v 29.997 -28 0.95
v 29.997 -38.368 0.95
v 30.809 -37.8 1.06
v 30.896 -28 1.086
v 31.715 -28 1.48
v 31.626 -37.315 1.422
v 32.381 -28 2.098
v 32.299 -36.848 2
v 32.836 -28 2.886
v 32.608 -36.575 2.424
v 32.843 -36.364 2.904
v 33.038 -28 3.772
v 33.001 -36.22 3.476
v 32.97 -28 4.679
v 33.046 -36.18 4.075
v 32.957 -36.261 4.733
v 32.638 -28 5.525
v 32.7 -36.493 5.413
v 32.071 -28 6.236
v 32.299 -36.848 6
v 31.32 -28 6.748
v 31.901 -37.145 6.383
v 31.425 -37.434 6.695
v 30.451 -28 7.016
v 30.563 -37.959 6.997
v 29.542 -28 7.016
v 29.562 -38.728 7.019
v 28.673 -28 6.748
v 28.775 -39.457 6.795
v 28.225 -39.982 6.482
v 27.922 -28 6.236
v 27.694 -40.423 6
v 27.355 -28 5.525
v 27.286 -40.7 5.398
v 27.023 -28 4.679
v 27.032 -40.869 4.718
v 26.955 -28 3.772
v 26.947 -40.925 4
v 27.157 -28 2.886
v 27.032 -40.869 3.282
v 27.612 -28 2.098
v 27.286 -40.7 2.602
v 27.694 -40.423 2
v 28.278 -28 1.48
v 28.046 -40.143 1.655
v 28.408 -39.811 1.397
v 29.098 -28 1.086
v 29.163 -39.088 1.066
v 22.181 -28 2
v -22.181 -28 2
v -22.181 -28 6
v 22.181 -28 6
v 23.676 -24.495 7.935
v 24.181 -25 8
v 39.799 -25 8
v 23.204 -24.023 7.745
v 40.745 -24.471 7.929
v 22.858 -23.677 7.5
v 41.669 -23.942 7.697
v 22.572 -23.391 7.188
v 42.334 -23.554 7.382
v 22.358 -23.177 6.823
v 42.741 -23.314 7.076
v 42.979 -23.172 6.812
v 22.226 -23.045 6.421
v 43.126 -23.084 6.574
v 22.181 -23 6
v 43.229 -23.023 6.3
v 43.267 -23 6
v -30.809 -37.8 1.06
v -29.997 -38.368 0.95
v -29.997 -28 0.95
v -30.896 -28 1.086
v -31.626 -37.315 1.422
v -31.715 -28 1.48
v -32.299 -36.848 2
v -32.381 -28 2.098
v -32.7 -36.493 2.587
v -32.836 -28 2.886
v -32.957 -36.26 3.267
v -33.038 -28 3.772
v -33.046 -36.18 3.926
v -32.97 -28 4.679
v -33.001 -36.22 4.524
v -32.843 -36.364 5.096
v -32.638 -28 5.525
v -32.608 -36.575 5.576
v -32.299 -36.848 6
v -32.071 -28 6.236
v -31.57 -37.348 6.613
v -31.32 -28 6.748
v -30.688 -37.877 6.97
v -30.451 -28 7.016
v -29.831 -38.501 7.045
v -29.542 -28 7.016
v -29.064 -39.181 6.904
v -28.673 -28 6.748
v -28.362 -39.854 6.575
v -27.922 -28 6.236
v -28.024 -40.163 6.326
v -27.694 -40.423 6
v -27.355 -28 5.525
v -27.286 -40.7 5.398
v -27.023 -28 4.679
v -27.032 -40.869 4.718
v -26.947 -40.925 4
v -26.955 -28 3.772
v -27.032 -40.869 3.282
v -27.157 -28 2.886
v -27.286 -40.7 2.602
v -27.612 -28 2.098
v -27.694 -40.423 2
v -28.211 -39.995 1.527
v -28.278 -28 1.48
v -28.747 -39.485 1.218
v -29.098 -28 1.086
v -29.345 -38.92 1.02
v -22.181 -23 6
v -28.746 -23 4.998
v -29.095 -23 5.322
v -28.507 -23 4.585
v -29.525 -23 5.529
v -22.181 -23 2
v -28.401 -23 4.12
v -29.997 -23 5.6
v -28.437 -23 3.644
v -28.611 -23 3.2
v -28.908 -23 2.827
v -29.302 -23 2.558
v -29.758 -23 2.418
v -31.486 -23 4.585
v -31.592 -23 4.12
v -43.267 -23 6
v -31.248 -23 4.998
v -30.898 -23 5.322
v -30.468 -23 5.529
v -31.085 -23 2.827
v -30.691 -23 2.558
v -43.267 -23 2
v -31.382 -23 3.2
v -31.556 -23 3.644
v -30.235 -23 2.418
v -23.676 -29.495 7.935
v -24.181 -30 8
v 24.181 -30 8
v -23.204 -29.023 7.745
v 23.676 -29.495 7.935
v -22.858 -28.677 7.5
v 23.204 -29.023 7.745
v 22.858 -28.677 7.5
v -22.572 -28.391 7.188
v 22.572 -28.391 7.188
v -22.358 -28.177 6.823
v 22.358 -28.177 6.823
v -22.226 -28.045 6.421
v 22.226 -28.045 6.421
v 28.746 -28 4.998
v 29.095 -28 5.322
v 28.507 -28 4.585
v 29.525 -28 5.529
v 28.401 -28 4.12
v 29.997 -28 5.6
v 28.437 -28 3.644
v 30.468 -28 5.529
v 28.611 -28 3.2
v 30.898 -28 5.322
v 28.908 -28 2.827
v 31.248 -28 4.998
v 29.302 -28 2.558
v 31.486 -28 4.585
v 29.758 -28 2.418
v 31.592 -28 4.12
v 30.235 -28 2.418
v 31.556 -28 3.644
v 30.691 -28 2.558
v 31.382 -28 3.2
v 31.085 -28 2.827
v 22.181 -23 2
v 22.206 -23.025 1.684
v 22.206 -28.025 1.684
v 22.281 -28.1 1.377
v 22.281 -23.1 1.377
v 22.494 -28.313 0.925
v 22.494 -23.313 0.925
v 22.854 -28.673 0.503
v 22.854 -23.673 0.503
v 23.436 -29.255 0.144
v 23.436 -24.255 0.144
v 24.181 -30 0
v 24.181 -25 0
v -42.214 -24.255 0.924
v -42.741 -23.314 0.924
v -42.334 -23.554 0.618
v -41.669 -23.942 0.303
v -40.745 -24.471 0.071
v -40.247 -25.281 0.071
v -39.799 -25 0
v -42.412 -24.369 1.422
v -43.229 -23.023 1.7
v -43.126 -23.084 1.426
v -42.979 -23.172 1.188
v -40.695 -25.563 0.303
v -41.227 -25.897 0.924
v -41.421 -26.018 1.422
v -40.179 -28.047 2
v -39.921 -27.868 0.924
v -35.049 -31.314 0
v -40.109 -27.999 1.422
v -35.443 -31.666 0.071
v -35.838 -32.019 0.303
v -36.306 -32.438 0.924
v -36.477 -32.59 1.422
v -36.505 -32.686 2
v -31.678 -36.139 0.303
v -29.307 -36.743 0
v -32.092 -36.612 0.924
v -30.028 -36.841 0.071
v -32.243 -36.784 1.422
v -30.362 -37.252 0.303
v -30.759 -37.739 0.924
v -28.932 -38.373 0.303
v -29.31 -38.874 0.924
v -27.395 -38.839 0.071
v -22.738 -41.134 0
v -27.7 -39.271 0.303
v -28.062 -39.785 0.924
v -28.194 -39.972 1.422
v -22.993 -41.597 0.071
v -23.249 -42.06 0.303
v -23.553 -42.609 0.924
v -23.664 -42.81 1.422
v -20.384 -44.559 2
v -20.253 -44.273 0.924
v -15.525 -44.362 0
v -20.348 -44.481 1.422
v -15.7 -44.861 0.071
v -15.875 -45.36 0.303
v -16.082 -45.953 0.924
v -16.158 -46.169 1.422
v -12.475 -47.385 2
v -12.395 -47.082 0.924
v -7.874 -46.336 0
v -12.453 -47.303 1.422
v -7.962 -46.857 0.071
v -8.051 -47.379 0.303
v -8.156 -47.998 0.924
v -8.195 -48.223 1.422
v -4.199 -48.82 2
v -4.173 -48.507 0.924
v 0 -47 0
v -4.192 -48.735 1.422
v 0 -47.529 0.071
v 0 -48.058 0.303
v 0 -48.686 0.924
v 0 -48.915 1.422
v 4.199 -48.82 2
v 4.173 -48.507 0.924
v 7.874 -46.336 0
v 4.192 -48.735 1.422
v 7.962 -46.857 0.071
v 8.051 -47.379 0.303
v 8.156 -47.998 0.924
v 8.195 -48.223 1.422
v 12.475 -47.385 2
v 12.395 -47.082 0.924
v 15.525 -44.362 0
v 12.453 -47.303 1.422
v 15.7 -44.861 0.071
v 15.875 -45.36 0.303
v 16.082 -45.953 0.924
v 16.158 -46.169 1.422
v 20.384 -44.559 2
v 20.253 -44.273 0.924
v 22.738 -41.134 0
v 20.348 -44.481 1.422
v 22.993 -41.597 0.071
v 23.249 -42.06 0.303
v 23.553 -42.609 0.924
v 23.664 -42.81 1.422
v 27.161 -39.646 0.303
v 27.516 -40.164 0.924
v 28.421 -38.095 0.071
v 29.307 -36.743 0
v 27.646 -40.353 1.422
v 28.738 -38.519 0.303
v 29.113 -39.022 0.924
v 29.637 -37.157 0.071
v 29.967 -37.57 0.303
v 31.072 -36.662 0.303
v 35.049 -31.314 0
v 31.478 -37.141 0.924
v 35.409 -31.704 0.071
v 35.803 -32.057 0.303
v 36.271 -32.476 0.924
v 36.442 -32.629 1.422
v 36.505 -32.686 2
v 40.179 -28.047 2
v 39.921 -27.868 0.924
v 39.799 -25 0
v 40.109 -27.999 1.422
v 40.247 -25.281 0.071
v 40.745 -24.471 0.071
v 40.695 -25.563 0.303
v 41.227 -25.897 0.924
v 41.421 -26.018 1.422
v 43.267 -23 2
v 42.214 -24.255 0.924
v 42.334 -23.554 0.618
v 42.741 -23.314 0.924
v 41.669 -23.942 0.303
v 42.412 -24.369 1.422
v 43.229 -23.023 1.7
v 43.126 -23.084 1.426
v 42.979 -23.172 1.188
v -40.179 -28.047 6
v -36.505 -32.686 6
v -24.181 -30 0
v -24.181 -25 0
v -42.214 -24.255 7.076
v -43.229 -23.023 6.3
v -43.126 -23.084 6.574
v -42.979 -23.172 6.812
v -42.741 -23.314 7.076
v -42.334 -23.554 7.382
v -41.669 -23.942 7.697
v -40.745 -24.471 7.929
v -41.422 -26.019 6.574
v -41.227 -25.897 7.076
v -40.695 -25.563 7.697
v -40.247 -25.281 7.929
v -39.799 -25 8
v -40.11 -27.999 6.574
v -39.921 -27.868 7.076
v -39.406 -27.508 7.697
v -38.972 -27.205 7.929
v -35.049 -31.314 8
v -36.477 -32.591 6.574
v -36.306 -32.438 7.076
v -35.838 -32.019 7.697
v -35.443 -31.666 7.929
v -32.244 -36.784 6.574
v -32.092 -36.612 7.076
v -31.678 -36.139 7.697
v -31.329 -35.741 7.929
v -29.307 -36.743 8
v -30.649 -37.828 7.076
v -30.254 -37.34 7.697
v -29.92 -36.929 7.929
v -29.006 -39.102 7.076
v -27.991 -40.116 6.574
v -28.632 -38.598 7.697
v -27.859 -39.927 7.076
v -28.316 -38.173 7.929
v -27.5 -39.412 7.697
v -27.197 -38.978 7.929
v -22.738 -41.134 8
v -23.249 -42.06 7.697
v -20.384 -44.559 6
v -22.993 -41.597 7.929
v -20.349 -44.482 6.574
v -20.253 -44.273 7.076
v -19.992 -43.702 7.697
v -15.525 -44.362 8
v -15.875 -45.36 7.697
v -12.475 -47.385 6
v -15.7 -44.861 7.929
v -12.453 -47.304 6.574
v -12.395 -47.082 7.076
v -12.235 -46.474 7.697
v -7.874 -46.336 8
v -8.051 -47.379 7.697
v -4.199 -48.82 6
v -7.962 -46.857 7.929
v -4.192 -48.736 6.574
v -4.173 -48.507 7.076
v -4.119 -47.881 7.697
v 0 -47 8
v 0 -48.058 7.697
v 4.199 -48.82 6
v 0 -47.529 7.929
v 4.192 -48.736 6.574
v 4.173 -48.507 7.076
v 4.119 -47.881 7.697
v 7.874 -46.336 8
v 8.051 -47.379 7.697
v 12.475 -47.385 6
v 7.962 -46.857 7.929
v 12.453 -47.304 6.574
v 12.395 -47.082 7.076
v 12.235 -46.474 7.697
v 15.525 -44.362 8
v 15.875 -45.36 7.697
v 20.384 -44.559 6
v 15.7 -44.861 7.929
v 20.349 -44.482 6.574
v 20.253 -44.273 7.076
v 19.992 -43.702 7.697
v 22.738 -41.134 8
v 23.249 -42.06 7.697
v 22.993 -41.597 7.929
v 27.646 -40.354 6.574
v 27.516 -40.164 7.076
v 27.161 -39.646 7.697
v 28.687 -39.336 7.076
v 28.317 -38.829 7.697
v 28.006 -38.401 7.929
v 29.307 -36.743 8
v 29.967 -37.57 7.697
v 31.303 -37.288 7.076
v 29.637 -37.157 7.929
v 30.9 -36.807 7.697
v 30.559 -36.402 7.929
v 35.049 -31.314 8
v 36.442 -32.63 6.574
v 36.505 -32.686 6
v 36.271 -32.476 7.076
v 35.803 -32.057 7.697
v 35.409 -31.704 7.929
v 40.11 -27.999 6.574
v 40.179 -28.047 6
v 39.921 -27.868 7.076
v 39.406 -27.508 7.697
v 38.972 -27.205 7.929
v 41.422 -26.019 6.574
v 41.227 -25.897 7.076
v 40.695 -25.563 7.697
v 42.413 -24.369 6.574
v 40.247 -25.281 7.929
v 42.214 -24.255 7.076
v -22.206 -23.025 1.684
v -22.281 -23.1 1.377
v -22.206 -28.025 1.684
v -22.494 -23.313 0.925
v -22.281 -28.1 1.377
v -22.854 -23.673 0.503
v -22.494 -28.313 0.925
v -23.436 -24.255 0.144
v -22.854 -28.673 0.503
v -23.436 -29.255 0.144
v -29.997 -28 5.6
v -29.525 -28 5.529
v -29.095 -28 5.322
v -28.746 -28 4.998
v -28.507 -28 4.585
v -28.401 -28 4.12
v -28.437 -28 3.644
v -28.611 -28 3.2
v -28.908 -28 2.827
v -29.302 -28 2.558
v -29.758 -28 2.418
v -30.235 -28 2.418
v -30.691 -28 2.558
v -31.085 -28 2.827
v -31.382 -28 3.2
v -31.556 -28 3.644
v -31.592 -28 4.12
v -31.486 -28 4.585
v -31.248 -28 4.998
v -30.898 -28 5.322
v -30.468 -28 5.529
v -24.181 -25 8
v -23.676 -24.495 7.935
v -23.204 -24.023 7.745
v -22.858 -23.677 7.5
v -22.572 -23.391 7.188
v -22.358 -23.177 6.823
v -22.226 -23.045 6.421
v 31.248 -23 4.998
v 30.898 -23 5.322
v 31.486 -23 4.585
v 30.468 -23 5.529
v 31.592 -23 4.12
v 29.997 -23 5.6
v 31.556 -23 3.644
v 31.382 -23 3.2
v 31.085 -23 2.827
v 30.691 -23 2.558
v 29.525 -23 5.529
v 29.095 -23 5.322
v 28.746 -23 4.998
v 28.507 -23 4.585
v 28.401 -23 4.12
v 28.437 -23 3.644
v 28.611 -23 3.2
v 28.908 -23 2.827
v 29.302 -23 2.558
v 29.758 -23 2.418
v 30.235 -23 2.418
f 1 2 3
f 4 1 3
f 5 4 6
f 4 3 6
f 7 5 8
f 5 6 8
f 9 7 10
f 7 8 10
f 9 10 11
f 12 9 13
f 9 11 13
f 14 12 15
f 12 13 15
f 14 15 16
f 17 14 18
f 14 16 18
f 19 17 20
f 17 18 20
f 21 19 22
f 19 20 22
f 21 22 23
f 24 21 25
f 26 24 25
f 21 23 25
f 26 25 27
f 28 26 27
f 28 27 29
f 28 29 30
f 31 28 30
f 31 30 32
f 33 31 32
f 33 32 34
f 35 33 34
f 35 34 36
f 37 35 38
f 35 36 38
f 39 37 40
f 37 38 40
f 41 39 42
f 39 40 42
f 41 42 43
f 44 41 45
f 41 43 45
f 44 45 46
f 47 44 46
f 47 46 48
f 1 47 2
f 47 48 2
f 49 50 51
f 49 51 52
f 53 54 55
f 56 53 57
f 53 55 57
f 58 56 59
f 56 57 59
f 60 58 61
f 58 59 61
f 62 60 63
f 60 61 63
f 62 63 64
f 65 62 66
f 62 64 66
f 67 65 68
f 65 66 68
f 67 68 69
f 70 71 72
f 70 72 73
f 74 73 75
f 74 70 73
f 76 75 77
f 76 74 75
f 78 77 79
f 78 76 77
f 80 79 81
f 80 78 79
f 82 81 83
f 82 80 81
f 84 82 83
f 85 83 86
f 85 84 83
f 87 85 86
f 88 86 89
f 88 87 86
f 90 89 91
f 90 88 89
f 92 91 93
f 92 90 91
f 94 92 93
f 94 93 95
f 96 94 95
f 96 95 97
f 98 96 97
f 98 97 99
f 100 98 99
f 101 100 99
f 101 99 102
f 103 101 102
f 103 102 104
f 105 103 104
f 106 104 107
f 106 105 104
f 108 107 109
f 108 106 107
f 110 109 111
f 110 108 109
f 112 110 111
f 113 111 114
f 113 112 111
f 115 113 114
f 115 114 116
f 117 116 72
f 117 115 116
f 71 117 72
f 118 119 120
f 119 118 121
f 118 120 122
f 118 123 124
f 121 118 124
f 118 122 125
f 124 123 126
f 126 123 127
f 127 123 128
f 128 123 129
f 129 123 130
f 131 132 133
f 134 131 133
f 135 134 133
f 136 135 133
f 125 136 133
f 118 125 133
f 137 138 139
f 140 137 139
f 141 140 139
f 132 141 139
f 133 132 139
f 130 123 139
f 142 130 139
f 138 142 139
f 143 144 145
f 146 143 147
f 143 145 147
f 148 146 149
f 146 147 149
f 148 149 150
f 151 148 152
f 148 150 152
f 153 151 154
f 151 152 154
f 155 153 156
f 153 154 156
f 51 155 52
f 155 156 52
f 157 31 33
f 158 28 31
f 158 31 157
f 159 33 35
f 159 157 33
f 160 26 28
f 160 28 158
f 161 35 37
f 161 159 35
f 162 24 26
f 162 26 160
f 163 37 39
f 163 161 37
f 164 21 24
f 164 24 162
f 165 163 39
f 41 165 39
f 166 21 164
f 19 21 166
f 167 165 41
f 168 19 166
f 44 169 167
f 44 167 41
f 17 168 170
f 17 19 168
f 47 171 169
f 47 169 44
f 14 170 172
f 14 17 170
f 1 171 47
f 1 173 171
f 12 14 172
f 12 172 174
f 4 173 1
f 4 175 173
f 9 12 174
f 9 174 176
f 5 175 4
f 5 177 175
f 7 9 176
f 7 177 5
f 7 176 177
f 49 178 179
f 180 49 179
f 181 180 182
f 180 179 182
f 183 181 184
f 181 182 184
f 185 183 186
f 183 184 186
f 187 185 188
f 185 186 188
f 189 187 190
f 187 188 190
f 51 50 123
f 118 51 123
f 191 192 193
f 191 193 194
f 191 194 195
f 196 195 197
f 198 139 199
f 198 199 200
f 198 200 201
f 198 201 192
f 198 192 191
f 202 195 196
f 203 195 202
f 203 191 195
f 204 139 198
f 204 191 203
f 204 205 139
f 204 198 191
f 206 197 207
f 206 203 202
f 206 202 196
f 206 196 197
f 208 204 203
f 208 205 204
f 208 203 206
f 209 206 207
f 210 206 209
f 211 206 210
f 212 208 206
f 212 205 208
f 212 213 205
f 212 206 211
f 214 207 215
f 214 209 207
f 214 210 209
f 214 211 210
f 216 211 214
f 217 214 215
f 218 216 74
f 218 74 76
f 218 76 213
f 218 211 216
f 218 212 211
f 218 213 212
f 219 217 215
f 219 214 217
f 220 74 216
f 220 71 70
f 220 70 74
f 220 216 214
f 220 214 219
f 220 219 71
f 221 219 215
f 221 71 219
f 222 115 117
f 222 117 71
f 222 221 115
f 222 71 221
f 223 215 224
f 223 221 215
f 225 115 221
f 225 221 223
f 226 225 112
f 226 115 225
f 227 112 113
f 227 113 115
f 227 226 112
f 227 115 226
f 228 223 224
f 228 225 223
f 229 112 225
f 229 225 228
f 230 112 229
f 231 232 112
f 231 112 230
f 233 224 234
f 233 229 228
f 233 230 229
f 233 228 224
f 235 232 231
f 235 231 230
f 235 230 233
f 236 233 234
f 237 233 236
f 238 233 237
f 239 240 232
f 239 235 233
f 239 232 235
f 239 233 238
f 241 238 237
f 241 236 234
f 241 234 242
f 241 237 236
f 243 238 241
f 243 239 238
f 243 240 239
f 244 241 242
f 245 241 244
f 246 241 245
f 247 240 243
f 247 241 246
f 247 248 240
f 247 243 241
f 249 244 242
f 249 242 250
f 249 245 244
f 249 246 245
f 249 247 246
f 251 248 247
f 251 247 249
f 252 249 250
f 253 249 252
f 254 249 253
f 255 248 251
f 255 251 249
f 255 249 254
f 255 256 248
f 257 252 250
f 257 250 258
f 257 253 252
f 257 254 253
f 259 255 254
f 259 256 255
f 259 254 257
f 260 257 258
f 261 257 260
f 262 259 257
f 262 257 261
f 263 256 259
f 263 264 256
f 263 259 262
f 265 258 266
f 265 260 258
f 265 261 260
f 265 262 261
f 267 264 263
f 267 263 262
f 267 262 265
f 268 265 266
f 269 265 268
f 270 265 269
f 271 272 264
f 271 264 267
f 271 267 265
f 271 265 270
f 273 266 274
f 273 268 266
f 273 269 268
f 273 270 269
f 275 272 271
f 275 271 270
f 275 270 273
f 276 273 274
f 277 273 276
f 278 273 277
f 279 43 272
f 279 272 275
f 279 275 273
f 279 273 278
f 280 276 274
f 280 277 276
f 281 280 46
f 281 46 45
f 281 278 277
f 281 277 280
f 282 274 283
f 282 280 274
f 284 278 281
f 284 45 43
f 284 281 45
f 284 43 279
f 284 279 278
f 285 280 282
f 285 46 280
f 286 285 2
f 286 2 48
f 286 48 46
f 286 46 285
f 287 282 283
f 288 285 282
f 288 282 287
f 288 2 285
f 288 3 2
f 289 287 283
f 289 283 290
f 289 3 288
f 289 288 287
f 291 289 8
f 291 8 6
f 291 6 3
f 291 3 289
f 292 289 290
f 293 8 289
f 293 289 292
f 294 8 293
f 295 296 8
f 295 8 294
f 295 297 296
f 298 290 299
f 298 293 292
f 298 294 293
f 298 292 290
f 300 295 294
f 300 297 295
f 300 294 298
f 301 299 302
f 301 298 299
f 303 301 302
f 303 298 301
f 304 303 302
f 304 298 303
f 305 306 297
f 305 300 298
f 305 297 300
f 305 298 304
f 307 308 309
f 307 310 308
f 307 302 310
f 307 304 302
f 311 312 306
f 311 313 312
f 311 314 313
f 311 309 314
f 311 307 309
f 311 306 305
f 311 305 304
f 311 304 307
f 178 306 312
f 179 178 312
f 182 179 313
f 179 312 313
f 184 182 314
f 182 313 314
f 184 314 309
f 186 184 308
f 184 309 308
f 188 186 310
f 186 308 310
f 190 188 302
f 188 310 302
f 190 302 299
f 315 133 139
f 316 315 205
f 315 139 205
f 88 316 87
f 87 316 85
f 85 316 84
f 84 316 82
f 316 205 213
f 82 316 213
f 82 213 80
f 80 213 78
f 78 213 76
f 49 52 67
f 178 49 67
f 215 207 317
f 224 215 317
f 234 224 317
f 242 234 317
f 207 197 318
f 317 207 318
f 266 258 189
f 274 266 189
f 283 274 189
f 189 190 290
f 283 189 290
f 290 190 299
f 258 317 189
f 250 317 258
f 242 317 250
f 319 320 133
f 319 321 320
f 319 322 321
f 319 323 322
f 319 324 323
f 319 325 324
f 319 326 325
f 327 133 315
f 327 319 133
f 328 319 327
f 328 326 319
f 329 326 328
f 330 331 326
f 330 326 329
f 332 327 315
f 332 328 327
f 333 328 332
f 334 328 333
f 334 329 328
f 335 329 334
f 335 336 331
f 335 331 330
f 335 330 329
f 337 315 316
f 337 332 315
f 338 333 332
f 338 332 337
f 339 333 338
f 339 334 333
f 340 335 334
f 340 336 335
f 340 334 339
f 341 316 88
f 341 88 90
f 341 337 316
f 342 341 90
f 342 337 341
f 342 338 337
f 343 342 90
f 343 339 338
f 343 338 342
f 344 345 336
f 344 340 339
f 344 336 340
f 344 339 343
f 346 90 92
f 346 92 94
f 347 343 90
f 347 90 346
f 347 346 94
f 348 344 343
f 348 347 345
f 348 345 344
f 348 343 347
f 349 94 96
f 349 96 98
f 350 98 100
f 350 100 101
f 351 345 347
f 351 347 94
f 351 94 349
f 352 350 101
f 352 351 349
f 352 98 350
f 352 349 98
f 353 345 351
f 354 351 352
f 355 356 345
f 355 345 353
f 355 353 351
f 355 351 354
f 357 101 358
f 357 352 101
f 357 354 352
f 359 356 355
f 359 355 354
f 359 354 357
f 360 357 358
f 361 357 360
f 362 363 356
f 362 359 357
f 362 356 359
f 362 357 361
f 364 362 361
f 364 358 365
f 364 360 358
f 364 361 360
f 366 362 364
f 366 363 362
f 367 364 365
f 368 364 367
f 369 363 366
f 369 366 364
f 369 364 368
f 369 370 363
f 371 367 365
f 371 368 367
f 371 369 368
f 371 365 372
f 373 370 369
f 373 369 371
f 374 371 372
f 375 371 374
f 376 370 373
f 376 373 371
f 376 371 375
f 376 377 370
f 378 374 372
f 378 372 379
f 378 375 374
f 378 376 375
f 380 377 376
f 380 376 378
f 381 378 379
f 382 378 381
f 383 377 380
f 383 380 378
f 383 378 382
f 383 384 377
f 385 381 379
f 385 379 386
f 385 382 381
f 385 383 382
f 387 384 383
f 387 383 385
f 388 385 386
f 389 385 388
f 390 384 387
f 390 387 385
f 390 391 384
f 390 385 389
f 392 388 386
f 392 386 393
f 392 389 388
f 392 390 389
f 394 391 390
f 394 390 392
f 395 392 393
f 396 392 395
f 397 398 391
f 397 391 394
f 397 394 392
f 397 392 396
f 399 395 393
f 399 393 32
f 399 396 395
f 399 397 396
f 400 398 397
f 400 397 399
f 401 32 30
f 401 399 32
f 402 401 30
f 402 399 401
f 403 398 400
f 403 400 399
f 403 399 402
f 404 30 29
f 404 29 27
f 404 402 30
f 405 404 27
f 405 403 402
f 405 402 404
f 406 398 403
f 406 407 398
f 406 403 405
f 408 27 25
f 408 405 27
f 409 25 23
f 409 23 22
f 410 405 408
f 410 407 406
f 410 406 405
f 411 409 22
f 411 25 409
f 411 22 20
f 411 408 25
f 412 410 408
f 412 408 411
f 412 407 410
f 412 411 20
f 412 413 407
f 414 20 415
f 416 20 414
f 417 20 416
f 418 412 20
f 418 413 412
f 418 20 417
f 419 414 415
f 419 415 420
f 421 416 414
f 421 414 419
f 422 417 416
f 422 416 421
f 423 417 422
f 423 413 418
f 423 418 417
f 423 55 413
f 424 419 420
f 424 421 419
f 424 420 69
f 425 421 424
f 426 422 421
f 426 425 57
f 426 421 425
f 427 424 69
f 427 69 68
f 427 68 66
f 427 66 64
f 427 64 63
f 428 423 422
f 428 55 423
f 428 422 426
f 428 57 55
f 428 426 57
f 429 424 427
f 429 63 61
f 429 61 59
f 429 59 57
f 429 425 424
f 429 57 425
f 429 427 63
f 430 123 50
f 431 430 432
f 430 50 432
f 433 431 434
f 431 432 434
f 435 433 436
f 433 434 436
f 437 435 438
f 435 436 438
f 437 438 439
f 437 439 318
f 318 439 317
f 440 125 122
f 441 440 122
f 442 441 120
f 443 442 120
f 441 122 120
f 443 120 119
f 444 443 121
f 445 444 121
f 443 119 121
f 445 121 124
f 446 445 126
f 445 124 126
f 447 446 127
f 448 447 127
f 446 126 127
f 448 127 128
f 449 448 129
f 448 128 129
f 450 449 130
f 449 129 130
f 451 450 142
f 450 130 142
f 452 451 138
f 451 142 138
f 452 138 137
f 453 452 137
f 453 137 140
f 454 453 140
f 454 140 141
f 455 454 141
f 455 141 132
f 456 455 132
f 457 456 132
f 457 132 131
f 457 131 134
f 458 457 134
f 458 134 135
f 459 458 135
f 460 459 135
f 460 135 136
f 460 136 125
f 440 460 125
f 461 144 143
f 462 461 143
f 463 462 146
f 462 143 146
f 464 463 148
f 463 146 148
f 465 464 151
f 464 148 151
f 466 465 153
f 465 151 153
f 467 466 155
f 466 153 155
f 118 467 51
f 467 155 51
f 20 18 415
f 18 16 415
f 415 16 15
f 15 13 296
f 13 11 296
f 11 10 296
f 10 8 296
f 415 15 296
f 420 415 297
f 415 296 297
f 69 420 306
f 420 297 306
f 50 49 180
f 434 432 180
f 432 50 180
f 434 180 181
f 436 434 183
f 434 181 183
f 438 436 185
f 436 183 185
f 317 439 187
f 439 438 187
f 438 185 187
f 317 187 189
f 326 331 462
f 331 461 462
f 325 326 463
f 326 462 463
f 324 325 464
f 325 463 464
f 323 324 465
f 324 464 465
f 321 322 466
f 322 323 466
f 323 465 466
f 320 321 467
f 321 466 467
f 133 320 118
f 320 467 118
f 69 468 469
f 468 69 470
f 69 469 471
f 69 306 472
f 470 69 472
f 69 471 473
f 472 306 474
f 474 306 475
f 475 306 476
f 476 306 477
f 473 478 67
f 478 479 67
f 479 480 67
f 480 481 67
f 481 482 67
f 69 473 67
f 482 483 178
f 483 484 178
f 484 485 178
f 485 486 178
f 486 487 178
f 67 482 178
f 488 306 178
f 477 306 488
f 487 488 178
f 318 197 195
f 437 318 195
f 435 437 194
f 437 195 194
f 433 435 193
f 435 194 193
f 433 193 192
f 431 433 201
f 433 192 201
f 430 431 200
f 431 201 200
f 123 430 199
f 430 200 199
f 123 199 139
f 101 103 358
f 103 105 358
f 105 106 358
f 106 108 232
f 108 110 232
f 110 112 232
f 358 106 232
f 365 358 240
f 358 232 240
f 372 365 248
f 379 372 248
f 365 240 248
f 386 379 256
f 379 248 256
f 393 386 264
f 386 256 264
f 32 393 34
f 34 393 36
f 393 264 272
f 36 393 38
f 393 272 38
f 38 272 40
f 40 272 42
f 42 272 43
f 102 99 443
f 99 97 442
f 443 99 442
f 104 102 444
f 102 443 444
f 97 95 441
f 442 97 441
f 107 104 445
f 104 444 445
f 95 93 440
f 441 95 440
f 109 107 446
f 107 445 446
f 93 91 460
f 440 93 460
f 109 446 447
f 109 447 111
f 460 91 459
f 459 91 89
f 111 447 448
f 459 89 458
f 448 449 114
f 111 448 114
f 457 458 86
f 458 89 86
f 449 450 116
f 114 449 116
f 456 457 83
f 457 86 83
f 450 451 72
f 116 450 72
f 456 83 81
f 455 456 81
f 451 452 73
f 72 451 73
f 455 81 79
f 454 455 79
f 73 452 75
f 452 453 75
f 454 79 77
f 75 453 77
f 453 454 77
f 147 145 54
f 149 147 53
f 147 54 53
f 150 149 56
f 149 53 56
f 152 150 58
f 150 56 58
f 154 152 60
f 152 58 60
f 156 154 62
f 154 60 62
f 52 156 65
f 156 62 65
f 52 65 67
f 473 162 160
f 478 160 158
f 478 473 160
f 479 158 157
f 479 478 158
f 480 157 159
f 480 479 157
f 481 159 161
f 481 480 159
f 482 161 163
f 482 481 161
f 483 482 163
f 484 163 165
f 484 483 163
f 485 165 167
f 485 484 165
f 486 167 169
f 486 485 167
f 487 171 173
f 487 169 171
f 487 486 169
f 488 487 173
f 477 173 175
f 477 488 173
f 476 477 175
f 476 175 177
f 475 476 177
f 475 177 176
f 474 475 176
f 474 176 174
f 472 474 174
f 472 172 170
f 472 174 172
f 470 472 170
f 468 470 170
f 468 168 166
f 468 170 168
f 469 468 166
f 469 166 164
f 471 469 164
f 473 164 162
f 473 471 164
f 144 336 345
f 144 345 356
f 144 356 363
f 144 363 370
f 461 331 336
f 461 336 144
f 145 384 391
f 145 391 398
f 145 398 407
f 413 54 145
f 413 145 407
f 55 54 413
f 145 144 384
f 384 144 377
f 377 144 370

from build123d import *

# Parameters (mm, degrees)
SKETCH1_W           = 44.362146026
SKETCH1_H           = 10
BOSS_EXTRUDE1_DEPTH = 8
SKETCH2_R           = 1.6
CUT_EXTRUDE1_DEPTH  = 52.107729357
CUT_EXTRUDE2_START  = -17.925297
SKETCH3_R           = 3.05
CUT_EXTRUDE2_DEPTH  = 12.925297
FILLET1_R           = 2


with BuildPart() as part:
    # Sketch1 → Boss-Extrude1 (new body)
    with BuildSketch(Plane.XY):
        with BuildLine():
            Line((-29.953929645, -23), (-37.509998667, -23))
            ThreePointArc((-37.509998667, -23), (-35.812927639, -25.562359318), (-33.941125497, -28))
            Line((-33.941125497, -28), (-22.181073013, -28))
            Line((-22.181073013, -28), (-22.181073013, -23))
            Line((-22.181073013, -23), (-29.953929645, -23))
        make_face()
        with BuildLine():
            Line((-37.509998667, -23), (-43.266615306, -23))
            ThreePointArc((-43.266615306, -23), (0, -49), (43.266615306, -23))
            Line((43.266615306, -23), (37.509998667, -23))
            ThreePointArc((37.509998667, -23), (35.812927639, -25.562359318), (33.941125497, -28))
            ThreePointArc((33.941125497, -28), (28.503075122, -33.519765939), (22.181073013, -38))
            ThreePointArc((22.181073013, -38), (0, -44), (-22.181073013, -38))
            ThreePointArc((-22.181073013, -38), (-28.503075122, -33.519765939), (-33.941125497, -28))
            ThreePointArc((-33.941125497, -28), (-35.812927639, -25.562359318), (-37.509998667, -23))
        make_face()
        with BuildLine():
            Line((-22.181073013, -28), (-33.941125497, -28))
            ThreePointArc((-33.941125497, -28), (-28.503075122, -33.519765939), (-22.181073013, -38))
            Line((-22.181073013, -38), (-22.181073013, -28))
        make_face()
        with BuildLine():
            ThreePointArc((22.181073013, -38), (28.503075122, -33.519765939), (33.941125497, -28))
            Line((33.941125497, -28), (22.181073013, -28))
            Line((22.181073013, -28), (22.181073013, -38))
        make_face()
        with BuildLine():
            ThreePointArc((33.941125497, -28), (35.812927639, -25.562359318), (37.509998667, -23))
            Line((37.509998667, -23), (22.181073013, -23))
            Line((22.181073013, -23), (22.181073013, -28))
            Line((22.181073013, -28), (33.941125497, -28))
        make_face()
        with Locations((0, -33)):
            Rectangle(SKETCH1_W, SKETCH1_H)
        with BuildLine():
            Line((22.181073013, -38), (-22.181073013, -38))
            ThreePointArc((-22.181073013, -38), (0, -44), (22.181073013, -38))
        make_face()
    extrude(amount=BOSS_EXTRUDE1_DEPTH)

    # Sketch2 → Cut-Extrude1 (cut, through all)
    with BuildSketch(Plane(origin=(0, -23, 0), x_dir=(1, 0, 0), z_dir=(0, 1, 0))):
        with Locations(Location((-29.996615306, -4, 0), (0, 0, 270))):
            Circle(SKETCH2_R)
    cut_extrude1 = extrude(amount=-CUT_EXTRUDE1_DEPTH, mode=Mode.SUBTRACT)

    # Sketch3 → Cut-Extrude2 (cut)
    with BuildSketch(Plane(origin=(0, -23, 0), x_dir=(1, 0, 0), z_dir=(0, 1, 0)).offset(CUT_EXTRUDE2_START)):
        with Locations(Location((-29.996615306, -4, 0), (0, 0, 90))):
            Circle(SKETCH3_R)
    cut_extrude2 = extrude(amount=CUT_EXTRUDE2_DEPTH, mode=Mode.SUBTRACT)

    # Mirror1: Cut-Extrude1, Cut-Extrude2 across plane
    add(cut_extrude1.mirror(Plane(origin=(0, 0, 0), x_dir=(0, 0, 1), z_dir=(1, 0, 0))), mode=Mode.SUBTRACT)
    add(cut_extrude2.mirror(Plane(origin=(0, 0, 0), x_dir=(0, 0, 1), z_dir=(1, 0, 0))), mode=Mode.SUBTRACT)

    # Fillet1
    # the kernel refuses this fillet: 2 mm, written as the material it takes off along each edge
    with BuildSketch(Plane(origin=(22.181073013, -28, 8), x_dir=(0, -1, 0), z_dir=(-1, 0, 0))) as fillet1_piece_1:
        with BuildLine():
            CenterArc((FILLET1_R, -FILLET1_R), FILLET1_R, 90, 90)
            Line((0, -FILLET1_R), (0, 0))
            Line((0, 0), (FILLET1_R, 0))
        make_face()
    extrude(amount=44.362146026, mode=Mode.SUBTRACT)
    with BuildSketch(Plane(origin=(22.181073013, -28, 0), x_dir=(0, -1, 0), z_dir=(-1, 0, 0))) as fillet1_piece_2:
        with BuildLine():
            CenterArc((FILLET1_R, FILLET1_R), FILLET1_R, 180, 90)
            Line((0, FILLET1_R), (0, 0))
            Line((0, 0), (FILLET1_R, 0))
        make_face()
    extrude(amount=44.362146026, mode=Mode.SUBTRACT)
    with BuildSketch(Plane(origin=(22.181073013, -18, 0), x_dir=(1, 0, 0), z_dir=(0, -1, 0))) as fillet1_piece_3:
        with BuildLine():
            CenterArc((FILLET1_R, FILLET1_R), FILLET1_R, 180, 90)
            Line((0, FILLET1_R), (0, 0))
            Line((0, 0), (FILLET1_R, 0))
        make_face()
    extrude(amount=10, mode=Mode.SUBTRACT)
    with BuildSketch(Plane(origin=(-22.181073013, -28, 8), x_dir=(-1, 0, 0), z_dir=(0, 1, 0)), Plane(origin=(22.181073013, -18, 8), x_dir=(1, 0, 0), z_dir=(0, -1, 0)), Plane(origin=(-22.181073013, -28, 0), x_dir=(0, 0, 1), z_dir=(0, 1, 0))) as fillet1_piece_4:
        with BuildLine():
            CenterArc((FILLET1_R, -FILLET1_R), FILLET1_R, 90, 90)
            Line((0, -FILLET1_R), (0, 0))
            Line((0, 0), (FILLET1_R, 0))
        make_face()
    extrude(amount=10, mode=Mode.SUBTRACT)
    with BuildSketch(Plane(origin=(-17.181073013, -23, 8), x_dir=(0, -1, 0), z_dir=(-1, 0, 0)), Plane(origin=(48.266615306, -23, 8), x_dir=(0, -1, 0), z_dir=(-1, 0, 0)), Plane(origin=(-48.266615306, -23, 0), x_dir=(0, -1, 0), z_dir=(1, 0, 0))) as fillet1_piece_5:
        with BuildLine():
            CenterArc((FILLET1_R, -FILLET1_R), FILLET1_R, 90, 90)
            Line((0, -FILLET1_R), (0, 0))
            Line((0, 0), (FILLET1_R, 0))
        make_face()
    extrude(amount=31.085542293, mode=Mode.SUBTRACT)
    with BuildSketch(Plane(origin=(0, 0, 8), x_dir=(-0.9262421127905929, -0.3769291027411106, 0), z_dir=(-0.3769291027411106, 0.9262421127905929, 0))) as fillet1_piece_6:
        with BuildLine():
            CenterArc((49 - FILLET1_R, -FILLET1_R), FILLET1_R, 0, 90)
            Line((49, -FILLET1_R), (49, 0))
            Line((49, 0), (49 - FILLET1_R, 0))
        make_face()
    revolve(axis=Axis((0, 0, 8), (0, 0, 1)), revolution_arc=135.712813104, mode=Mode.SUBTRACT)
    with BuildSketch(Plane(origin=(48.266615306, -23, 0), x_dir=(0, -1, 0), z_dir=(-1, 0, 0))) as fillet1_piece_7:
        with BuildLine():
            CenterArc((FILLET1_R, FILLET1_R), FILLET1_R, 180, 90)
            Line((0, FILLET1_R), (0, 0))
            Line((0, 0), (FILLET1_R, 0))
        make_face()
    extrude(amount=31.085542293, mode=Mode.SUBTRACT)
    with BuildSketch(Plane(origin=(0, 0, 0), x_dir=(-0.9262421127905929, -0.3769291027411106, 0), z_dir=(-0.3769291027411106, 0.9262421127905929, 0))) as fillet1_piece_8:
        with BuildLine():
            CenterArc((49 - FILLET1_R, FILLET1_R), FILLET1_R, 270, 90)
            Line((49, FILLET1_R), (49, 0))
            Line((49, 0), (49 - FILLET1_R, 0))
        make_face()
    revolve(axis=Axis((0, 0, 0), (0, 0, 1)), revolution_arc=135.712813104, mode=Mode.SUBTRACT)
    with BuildSketch(Plane(origin=(22.181073013, -18, 8), x_dir=(1, 0, 0), z_dir=(0, -1, 0))) as fillet1_piece_9a_section:
        with BuildLine():
            CenterArc((FILLET1_R, -FILLET1_R), FILLET1_R, 90, 90)
            Line((0, -FILLET1_R), (0, 0))
            Line((0, 0), (FILLET1_R, 0))
        make_face()
    fillet1_piece_9a = extrude(amount=15, mode=Mode.PRIVATE)
    fillet1_piece_9a = split(fillet1_piece_9a, bisect_by=Plane(origin=(22.633863241, -28, 7.547209771), z_dir=(0, -1, 0)), keep=Keep.TOP, mode=Mode.PRIVATE)
    with BuildSketch(Plane(origin=(27.181073013, -28, 8), x_dir=(0, -1, 0), z_dir=(-1, 0, 0))) as fillet1_piece_9b_section:
        with BuildLine():
            CenterArc((FILLET1_R, -FILLET1_R), FILLET1_R, 90, 90)
            Line((0, -FILLET1_R), (0, 0))
            Line((0, 0), (FILLET1_R, 0))
        make_face()
    fillet1_piece_9b = extrude(amount=49.362146026, mode=Mode.PRIVATE)
    fillet1_piece_9b = split(fillet1_piece_9b, bisect_by=Plane(origin=(22.181073013, -28.452790229, 7.547209771), z_dir=(1, 0, 0)), keep=Keep.TOP, mode=Mode.PRIVATE)
    fillet1_piece_9 = fillet1_piece_9a & fillet1_piece_9b
    add(fillet1_piece_9, mode=Mode.SUBTRACT)
    with BuildSketch(Plane(origin=(22.181073013, -28, 8), x_dir=(0, -1, 0), z_dir=(-1, 0, 0))) as fillet1_piece_10a_section:
        with BuildLine():
            CenterArc((FILLET1_R, -FILLET1_R), FILLET1_R, 90, 90)
            Line((0, -FILLET1_R), (0, 0))
            Line((0, 0), (FILLET1_R, 0))
        make_face()
    fillet1_piece_10a = extrude(amount=49.362146026, mode=Mode.PRIVATE)
    fillet1_piece_10a = split(fillet1_piece_10a, bisect_by=Plane(origin=(-22.181073013, -28.452790229, 7.547209771), z_dir=(-1, 0, 0)), keep=Keep.TOP, mode=Mode.PRIVATE)
    with BuildSketch(Plane(origin=(-22.181073013, -33, 8), x_dir=(-1, 0, 0), z_dir=(0, 1, 0))) as fillet1_piece_10b_section:
        with BuildLine():
            CenterArc((FILLET1_R, -FILLET1_R), FILLET1_R, 90, 90)
            Line((0, -FILLET1_R), (0, 0))
            Line((0, 0), (FILLET1_R, 0))
        make_face()
    fillet1_piece_10b = extrude(amount=15, mode=Mode.PRIVATE)
    fillet1_piece_10b = split(fillet1_piece_10b, bisect_by=Plane(origin=(-22.633863241, -28, 7.547209771), z_dir=(0, -1, 0)), keep=Keep.TOP, mode=Mode.PRIVATE)
    fillet1_piece_10 = fillet1_piece_10a & fillet1_piece_10b
    add(fillet1_piece_10, mode=Mode.SUBTRACT)
    with BuildSketch(Plane(origin=(22.181073013, -18, 0), x_dir=(1, 0, 0), z_dir=(0, -1, 0))) as fillet1_piece_11a_section:
        with BuildLine():
            CenterArc((FILLET1_R, FILLET1_R), FILLET1_R, 180, 90)
            Line((0, FILLET1_R), (0, 0))
            Line((0, 0), (FILLET1_R, 0))
        make_face()
    fillet1_piece_11a = extrude(amount=15, mode=Mode.PRIVATE)
    fillet1_piece_11a = split(fillet1_piece_11a, bisect_by=Plane(origin=(22.633863241, -28, 0.452790229), z_dir=(0, -1, 0)), keep=Keep.TOP, mode=Mode.PRIVATE)
    with BuildSketch(Plane(origin=(27.181073013, -28, 0), x_dir=(0, -1, 0), z_dir=(-1, 0, 0))) as fillet1_piece_11b_section:
        with BuildLine():
            CenterArc((FILLET1_R, FILLET1_R), FILLET1_R, 180, 90)
            Line((0, FILLET1_R), (0, 0))
            Line((0, 0), (FILLET1_R, 0))
        make_face()
    fillet1_piece_11b = extrude(amount=49.362146026, mode=Mode.PRIVATE)
    fillet1_piece_11b = split(fillet1_piece_11b, bisect_by=Plane(origin=(22.181073013, -28.452790229, 0.452790229), z_dir=(1, 0, 0)), keep=Keep.TOP, mode=Mode.PRIVATE)
    fillet1_piece_11 = fillet1_piece_11a & fillet1_piece_11b
    add(fillet1_piece_11, mode=Mode.SUBTRACT)
    with BuildSketch(Plane(origin=(-22.181073013, -33, 0), x_dir=(0, 0, 1), z_dir=(0, 1, 0))) as fillet1_piece_12a_section:
        with BuildLine():
            CenterArc((FILLET1_R, -FILLET1_R), FILLET1_R, 90, 90)
            Line((0, -FILLET1_R), (0, 0))
            Line((0, 0), (FILLET1_R, 0))
        make_face()
    fillet1_piece_12a = extrude(amount=15, mode=Mode.PRIVATE)
    fillet1_piece_12a = split(fillet1_piece_12a, bisect_by=Plane(origin=(-22.633863241, -28, 0.452790229), z_dir=(0, -1, 0)), keep=Keep.TOP, mode=Mode.PRIVATE)
    with BuildSketch(Plane(origin=(22.181073013, -28, 0), x_dir=(0, -1, 0), z_dir=(-1, 0, 0))) as fillet1_piece_12b_section:
        with BuildLine():
            CenterArc((FILLET1_R, FILLET1_R), FILLET1_R, 180, 90)
            Line((0, FILLET1_R), (0, 0))
            Line((0, 0), (FILLET1_R, 0))
        make_face()
    fillet1_piece_12b = extrude(amount=49.362146026, mode=Mode.PRIVATE)
    fillet1_piece_12b = split(fillet1_piece_12b, bisect_by=Plane(origin=(-22.181073013, -28.452790229, 0.452790229), z_dir=(-1, 0, 0)), keep=Keep.TOP, mode=Mode.PRIVATE)
    fillet1_piece_12 = fillet1_piece_12a & fillet1_piece_12b
    add(fillet1_piece_12, mode=Mode.SUBTRACT)


solid = part.part
